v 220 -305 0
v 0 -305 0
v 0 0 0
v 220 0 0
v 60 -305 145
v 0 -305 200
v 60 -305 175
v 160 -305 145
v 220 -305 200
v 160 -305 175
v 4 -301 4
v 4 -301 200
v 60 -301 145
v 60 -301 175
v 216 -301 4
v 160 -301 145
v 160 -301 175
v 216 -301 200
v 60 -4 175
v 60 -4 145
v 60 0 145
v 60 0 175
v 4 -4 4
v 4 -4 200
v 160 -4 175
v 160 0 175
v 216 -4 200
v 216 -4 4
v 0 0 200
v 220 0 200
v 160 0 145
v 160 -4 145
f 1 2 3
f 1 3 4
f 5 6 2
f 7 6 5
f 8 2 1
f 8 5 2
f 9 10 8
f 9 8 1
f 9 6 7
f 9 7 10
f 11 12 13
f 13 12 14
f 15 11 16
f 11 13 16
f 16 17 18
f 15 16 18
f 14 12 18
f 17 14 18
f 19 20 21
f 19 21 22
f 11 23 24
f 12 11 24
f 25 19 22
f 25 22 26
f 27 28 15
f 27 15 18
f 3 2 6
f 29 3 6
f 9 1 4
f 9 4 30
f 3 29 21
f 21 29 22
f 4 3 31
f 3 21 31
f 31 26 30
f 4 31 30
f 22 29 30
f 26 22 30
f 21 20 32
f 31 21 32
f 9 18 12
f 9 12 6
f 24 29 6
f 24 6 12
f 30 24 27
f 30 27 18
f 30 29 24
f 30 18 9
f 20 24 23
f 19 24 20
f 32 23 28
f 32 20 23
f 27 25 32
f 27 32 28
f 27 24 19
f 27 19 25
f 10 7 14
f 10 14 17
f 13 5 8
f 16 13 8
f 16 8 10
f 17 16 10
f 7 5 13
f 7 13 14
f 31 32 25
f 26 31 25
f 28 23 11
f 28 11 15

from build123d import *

# Parameters (mm, degrees)
F0_W     = 220
F0_H     = 200
F1_DEPTH = 305
F2_T     = -4
F3_W     = 100
F3_H     = 30
F4_DEPTH = 305.001


with BuildPart() as f1:
    # F0 (on Front) → F1 (new body)
    with BuildSketch(Plane.XZ):
        with Locations((110, 100)):
            Rectangle(F0_W, F0_H)
    extrude(amount=F1_DEPTH)

    # F2
    f2_openings = [f1.faces().sort_by_distance(p)[0] for p in [
        (110, -152.5, 200),
    ]]
    offset(amount=F2_T, openings=f2_openings)

    # F3 (on face) → F4 (cut, through all)
    with BuildSketch(Plane.XZ.offset(305)):
        with Locations((110, 160)):
            Rectangle(F3_W, F3_H)
    extrude(amount=-F4_DEPTH, mode=Mode.SUBTRACT)


solid = f1.part
